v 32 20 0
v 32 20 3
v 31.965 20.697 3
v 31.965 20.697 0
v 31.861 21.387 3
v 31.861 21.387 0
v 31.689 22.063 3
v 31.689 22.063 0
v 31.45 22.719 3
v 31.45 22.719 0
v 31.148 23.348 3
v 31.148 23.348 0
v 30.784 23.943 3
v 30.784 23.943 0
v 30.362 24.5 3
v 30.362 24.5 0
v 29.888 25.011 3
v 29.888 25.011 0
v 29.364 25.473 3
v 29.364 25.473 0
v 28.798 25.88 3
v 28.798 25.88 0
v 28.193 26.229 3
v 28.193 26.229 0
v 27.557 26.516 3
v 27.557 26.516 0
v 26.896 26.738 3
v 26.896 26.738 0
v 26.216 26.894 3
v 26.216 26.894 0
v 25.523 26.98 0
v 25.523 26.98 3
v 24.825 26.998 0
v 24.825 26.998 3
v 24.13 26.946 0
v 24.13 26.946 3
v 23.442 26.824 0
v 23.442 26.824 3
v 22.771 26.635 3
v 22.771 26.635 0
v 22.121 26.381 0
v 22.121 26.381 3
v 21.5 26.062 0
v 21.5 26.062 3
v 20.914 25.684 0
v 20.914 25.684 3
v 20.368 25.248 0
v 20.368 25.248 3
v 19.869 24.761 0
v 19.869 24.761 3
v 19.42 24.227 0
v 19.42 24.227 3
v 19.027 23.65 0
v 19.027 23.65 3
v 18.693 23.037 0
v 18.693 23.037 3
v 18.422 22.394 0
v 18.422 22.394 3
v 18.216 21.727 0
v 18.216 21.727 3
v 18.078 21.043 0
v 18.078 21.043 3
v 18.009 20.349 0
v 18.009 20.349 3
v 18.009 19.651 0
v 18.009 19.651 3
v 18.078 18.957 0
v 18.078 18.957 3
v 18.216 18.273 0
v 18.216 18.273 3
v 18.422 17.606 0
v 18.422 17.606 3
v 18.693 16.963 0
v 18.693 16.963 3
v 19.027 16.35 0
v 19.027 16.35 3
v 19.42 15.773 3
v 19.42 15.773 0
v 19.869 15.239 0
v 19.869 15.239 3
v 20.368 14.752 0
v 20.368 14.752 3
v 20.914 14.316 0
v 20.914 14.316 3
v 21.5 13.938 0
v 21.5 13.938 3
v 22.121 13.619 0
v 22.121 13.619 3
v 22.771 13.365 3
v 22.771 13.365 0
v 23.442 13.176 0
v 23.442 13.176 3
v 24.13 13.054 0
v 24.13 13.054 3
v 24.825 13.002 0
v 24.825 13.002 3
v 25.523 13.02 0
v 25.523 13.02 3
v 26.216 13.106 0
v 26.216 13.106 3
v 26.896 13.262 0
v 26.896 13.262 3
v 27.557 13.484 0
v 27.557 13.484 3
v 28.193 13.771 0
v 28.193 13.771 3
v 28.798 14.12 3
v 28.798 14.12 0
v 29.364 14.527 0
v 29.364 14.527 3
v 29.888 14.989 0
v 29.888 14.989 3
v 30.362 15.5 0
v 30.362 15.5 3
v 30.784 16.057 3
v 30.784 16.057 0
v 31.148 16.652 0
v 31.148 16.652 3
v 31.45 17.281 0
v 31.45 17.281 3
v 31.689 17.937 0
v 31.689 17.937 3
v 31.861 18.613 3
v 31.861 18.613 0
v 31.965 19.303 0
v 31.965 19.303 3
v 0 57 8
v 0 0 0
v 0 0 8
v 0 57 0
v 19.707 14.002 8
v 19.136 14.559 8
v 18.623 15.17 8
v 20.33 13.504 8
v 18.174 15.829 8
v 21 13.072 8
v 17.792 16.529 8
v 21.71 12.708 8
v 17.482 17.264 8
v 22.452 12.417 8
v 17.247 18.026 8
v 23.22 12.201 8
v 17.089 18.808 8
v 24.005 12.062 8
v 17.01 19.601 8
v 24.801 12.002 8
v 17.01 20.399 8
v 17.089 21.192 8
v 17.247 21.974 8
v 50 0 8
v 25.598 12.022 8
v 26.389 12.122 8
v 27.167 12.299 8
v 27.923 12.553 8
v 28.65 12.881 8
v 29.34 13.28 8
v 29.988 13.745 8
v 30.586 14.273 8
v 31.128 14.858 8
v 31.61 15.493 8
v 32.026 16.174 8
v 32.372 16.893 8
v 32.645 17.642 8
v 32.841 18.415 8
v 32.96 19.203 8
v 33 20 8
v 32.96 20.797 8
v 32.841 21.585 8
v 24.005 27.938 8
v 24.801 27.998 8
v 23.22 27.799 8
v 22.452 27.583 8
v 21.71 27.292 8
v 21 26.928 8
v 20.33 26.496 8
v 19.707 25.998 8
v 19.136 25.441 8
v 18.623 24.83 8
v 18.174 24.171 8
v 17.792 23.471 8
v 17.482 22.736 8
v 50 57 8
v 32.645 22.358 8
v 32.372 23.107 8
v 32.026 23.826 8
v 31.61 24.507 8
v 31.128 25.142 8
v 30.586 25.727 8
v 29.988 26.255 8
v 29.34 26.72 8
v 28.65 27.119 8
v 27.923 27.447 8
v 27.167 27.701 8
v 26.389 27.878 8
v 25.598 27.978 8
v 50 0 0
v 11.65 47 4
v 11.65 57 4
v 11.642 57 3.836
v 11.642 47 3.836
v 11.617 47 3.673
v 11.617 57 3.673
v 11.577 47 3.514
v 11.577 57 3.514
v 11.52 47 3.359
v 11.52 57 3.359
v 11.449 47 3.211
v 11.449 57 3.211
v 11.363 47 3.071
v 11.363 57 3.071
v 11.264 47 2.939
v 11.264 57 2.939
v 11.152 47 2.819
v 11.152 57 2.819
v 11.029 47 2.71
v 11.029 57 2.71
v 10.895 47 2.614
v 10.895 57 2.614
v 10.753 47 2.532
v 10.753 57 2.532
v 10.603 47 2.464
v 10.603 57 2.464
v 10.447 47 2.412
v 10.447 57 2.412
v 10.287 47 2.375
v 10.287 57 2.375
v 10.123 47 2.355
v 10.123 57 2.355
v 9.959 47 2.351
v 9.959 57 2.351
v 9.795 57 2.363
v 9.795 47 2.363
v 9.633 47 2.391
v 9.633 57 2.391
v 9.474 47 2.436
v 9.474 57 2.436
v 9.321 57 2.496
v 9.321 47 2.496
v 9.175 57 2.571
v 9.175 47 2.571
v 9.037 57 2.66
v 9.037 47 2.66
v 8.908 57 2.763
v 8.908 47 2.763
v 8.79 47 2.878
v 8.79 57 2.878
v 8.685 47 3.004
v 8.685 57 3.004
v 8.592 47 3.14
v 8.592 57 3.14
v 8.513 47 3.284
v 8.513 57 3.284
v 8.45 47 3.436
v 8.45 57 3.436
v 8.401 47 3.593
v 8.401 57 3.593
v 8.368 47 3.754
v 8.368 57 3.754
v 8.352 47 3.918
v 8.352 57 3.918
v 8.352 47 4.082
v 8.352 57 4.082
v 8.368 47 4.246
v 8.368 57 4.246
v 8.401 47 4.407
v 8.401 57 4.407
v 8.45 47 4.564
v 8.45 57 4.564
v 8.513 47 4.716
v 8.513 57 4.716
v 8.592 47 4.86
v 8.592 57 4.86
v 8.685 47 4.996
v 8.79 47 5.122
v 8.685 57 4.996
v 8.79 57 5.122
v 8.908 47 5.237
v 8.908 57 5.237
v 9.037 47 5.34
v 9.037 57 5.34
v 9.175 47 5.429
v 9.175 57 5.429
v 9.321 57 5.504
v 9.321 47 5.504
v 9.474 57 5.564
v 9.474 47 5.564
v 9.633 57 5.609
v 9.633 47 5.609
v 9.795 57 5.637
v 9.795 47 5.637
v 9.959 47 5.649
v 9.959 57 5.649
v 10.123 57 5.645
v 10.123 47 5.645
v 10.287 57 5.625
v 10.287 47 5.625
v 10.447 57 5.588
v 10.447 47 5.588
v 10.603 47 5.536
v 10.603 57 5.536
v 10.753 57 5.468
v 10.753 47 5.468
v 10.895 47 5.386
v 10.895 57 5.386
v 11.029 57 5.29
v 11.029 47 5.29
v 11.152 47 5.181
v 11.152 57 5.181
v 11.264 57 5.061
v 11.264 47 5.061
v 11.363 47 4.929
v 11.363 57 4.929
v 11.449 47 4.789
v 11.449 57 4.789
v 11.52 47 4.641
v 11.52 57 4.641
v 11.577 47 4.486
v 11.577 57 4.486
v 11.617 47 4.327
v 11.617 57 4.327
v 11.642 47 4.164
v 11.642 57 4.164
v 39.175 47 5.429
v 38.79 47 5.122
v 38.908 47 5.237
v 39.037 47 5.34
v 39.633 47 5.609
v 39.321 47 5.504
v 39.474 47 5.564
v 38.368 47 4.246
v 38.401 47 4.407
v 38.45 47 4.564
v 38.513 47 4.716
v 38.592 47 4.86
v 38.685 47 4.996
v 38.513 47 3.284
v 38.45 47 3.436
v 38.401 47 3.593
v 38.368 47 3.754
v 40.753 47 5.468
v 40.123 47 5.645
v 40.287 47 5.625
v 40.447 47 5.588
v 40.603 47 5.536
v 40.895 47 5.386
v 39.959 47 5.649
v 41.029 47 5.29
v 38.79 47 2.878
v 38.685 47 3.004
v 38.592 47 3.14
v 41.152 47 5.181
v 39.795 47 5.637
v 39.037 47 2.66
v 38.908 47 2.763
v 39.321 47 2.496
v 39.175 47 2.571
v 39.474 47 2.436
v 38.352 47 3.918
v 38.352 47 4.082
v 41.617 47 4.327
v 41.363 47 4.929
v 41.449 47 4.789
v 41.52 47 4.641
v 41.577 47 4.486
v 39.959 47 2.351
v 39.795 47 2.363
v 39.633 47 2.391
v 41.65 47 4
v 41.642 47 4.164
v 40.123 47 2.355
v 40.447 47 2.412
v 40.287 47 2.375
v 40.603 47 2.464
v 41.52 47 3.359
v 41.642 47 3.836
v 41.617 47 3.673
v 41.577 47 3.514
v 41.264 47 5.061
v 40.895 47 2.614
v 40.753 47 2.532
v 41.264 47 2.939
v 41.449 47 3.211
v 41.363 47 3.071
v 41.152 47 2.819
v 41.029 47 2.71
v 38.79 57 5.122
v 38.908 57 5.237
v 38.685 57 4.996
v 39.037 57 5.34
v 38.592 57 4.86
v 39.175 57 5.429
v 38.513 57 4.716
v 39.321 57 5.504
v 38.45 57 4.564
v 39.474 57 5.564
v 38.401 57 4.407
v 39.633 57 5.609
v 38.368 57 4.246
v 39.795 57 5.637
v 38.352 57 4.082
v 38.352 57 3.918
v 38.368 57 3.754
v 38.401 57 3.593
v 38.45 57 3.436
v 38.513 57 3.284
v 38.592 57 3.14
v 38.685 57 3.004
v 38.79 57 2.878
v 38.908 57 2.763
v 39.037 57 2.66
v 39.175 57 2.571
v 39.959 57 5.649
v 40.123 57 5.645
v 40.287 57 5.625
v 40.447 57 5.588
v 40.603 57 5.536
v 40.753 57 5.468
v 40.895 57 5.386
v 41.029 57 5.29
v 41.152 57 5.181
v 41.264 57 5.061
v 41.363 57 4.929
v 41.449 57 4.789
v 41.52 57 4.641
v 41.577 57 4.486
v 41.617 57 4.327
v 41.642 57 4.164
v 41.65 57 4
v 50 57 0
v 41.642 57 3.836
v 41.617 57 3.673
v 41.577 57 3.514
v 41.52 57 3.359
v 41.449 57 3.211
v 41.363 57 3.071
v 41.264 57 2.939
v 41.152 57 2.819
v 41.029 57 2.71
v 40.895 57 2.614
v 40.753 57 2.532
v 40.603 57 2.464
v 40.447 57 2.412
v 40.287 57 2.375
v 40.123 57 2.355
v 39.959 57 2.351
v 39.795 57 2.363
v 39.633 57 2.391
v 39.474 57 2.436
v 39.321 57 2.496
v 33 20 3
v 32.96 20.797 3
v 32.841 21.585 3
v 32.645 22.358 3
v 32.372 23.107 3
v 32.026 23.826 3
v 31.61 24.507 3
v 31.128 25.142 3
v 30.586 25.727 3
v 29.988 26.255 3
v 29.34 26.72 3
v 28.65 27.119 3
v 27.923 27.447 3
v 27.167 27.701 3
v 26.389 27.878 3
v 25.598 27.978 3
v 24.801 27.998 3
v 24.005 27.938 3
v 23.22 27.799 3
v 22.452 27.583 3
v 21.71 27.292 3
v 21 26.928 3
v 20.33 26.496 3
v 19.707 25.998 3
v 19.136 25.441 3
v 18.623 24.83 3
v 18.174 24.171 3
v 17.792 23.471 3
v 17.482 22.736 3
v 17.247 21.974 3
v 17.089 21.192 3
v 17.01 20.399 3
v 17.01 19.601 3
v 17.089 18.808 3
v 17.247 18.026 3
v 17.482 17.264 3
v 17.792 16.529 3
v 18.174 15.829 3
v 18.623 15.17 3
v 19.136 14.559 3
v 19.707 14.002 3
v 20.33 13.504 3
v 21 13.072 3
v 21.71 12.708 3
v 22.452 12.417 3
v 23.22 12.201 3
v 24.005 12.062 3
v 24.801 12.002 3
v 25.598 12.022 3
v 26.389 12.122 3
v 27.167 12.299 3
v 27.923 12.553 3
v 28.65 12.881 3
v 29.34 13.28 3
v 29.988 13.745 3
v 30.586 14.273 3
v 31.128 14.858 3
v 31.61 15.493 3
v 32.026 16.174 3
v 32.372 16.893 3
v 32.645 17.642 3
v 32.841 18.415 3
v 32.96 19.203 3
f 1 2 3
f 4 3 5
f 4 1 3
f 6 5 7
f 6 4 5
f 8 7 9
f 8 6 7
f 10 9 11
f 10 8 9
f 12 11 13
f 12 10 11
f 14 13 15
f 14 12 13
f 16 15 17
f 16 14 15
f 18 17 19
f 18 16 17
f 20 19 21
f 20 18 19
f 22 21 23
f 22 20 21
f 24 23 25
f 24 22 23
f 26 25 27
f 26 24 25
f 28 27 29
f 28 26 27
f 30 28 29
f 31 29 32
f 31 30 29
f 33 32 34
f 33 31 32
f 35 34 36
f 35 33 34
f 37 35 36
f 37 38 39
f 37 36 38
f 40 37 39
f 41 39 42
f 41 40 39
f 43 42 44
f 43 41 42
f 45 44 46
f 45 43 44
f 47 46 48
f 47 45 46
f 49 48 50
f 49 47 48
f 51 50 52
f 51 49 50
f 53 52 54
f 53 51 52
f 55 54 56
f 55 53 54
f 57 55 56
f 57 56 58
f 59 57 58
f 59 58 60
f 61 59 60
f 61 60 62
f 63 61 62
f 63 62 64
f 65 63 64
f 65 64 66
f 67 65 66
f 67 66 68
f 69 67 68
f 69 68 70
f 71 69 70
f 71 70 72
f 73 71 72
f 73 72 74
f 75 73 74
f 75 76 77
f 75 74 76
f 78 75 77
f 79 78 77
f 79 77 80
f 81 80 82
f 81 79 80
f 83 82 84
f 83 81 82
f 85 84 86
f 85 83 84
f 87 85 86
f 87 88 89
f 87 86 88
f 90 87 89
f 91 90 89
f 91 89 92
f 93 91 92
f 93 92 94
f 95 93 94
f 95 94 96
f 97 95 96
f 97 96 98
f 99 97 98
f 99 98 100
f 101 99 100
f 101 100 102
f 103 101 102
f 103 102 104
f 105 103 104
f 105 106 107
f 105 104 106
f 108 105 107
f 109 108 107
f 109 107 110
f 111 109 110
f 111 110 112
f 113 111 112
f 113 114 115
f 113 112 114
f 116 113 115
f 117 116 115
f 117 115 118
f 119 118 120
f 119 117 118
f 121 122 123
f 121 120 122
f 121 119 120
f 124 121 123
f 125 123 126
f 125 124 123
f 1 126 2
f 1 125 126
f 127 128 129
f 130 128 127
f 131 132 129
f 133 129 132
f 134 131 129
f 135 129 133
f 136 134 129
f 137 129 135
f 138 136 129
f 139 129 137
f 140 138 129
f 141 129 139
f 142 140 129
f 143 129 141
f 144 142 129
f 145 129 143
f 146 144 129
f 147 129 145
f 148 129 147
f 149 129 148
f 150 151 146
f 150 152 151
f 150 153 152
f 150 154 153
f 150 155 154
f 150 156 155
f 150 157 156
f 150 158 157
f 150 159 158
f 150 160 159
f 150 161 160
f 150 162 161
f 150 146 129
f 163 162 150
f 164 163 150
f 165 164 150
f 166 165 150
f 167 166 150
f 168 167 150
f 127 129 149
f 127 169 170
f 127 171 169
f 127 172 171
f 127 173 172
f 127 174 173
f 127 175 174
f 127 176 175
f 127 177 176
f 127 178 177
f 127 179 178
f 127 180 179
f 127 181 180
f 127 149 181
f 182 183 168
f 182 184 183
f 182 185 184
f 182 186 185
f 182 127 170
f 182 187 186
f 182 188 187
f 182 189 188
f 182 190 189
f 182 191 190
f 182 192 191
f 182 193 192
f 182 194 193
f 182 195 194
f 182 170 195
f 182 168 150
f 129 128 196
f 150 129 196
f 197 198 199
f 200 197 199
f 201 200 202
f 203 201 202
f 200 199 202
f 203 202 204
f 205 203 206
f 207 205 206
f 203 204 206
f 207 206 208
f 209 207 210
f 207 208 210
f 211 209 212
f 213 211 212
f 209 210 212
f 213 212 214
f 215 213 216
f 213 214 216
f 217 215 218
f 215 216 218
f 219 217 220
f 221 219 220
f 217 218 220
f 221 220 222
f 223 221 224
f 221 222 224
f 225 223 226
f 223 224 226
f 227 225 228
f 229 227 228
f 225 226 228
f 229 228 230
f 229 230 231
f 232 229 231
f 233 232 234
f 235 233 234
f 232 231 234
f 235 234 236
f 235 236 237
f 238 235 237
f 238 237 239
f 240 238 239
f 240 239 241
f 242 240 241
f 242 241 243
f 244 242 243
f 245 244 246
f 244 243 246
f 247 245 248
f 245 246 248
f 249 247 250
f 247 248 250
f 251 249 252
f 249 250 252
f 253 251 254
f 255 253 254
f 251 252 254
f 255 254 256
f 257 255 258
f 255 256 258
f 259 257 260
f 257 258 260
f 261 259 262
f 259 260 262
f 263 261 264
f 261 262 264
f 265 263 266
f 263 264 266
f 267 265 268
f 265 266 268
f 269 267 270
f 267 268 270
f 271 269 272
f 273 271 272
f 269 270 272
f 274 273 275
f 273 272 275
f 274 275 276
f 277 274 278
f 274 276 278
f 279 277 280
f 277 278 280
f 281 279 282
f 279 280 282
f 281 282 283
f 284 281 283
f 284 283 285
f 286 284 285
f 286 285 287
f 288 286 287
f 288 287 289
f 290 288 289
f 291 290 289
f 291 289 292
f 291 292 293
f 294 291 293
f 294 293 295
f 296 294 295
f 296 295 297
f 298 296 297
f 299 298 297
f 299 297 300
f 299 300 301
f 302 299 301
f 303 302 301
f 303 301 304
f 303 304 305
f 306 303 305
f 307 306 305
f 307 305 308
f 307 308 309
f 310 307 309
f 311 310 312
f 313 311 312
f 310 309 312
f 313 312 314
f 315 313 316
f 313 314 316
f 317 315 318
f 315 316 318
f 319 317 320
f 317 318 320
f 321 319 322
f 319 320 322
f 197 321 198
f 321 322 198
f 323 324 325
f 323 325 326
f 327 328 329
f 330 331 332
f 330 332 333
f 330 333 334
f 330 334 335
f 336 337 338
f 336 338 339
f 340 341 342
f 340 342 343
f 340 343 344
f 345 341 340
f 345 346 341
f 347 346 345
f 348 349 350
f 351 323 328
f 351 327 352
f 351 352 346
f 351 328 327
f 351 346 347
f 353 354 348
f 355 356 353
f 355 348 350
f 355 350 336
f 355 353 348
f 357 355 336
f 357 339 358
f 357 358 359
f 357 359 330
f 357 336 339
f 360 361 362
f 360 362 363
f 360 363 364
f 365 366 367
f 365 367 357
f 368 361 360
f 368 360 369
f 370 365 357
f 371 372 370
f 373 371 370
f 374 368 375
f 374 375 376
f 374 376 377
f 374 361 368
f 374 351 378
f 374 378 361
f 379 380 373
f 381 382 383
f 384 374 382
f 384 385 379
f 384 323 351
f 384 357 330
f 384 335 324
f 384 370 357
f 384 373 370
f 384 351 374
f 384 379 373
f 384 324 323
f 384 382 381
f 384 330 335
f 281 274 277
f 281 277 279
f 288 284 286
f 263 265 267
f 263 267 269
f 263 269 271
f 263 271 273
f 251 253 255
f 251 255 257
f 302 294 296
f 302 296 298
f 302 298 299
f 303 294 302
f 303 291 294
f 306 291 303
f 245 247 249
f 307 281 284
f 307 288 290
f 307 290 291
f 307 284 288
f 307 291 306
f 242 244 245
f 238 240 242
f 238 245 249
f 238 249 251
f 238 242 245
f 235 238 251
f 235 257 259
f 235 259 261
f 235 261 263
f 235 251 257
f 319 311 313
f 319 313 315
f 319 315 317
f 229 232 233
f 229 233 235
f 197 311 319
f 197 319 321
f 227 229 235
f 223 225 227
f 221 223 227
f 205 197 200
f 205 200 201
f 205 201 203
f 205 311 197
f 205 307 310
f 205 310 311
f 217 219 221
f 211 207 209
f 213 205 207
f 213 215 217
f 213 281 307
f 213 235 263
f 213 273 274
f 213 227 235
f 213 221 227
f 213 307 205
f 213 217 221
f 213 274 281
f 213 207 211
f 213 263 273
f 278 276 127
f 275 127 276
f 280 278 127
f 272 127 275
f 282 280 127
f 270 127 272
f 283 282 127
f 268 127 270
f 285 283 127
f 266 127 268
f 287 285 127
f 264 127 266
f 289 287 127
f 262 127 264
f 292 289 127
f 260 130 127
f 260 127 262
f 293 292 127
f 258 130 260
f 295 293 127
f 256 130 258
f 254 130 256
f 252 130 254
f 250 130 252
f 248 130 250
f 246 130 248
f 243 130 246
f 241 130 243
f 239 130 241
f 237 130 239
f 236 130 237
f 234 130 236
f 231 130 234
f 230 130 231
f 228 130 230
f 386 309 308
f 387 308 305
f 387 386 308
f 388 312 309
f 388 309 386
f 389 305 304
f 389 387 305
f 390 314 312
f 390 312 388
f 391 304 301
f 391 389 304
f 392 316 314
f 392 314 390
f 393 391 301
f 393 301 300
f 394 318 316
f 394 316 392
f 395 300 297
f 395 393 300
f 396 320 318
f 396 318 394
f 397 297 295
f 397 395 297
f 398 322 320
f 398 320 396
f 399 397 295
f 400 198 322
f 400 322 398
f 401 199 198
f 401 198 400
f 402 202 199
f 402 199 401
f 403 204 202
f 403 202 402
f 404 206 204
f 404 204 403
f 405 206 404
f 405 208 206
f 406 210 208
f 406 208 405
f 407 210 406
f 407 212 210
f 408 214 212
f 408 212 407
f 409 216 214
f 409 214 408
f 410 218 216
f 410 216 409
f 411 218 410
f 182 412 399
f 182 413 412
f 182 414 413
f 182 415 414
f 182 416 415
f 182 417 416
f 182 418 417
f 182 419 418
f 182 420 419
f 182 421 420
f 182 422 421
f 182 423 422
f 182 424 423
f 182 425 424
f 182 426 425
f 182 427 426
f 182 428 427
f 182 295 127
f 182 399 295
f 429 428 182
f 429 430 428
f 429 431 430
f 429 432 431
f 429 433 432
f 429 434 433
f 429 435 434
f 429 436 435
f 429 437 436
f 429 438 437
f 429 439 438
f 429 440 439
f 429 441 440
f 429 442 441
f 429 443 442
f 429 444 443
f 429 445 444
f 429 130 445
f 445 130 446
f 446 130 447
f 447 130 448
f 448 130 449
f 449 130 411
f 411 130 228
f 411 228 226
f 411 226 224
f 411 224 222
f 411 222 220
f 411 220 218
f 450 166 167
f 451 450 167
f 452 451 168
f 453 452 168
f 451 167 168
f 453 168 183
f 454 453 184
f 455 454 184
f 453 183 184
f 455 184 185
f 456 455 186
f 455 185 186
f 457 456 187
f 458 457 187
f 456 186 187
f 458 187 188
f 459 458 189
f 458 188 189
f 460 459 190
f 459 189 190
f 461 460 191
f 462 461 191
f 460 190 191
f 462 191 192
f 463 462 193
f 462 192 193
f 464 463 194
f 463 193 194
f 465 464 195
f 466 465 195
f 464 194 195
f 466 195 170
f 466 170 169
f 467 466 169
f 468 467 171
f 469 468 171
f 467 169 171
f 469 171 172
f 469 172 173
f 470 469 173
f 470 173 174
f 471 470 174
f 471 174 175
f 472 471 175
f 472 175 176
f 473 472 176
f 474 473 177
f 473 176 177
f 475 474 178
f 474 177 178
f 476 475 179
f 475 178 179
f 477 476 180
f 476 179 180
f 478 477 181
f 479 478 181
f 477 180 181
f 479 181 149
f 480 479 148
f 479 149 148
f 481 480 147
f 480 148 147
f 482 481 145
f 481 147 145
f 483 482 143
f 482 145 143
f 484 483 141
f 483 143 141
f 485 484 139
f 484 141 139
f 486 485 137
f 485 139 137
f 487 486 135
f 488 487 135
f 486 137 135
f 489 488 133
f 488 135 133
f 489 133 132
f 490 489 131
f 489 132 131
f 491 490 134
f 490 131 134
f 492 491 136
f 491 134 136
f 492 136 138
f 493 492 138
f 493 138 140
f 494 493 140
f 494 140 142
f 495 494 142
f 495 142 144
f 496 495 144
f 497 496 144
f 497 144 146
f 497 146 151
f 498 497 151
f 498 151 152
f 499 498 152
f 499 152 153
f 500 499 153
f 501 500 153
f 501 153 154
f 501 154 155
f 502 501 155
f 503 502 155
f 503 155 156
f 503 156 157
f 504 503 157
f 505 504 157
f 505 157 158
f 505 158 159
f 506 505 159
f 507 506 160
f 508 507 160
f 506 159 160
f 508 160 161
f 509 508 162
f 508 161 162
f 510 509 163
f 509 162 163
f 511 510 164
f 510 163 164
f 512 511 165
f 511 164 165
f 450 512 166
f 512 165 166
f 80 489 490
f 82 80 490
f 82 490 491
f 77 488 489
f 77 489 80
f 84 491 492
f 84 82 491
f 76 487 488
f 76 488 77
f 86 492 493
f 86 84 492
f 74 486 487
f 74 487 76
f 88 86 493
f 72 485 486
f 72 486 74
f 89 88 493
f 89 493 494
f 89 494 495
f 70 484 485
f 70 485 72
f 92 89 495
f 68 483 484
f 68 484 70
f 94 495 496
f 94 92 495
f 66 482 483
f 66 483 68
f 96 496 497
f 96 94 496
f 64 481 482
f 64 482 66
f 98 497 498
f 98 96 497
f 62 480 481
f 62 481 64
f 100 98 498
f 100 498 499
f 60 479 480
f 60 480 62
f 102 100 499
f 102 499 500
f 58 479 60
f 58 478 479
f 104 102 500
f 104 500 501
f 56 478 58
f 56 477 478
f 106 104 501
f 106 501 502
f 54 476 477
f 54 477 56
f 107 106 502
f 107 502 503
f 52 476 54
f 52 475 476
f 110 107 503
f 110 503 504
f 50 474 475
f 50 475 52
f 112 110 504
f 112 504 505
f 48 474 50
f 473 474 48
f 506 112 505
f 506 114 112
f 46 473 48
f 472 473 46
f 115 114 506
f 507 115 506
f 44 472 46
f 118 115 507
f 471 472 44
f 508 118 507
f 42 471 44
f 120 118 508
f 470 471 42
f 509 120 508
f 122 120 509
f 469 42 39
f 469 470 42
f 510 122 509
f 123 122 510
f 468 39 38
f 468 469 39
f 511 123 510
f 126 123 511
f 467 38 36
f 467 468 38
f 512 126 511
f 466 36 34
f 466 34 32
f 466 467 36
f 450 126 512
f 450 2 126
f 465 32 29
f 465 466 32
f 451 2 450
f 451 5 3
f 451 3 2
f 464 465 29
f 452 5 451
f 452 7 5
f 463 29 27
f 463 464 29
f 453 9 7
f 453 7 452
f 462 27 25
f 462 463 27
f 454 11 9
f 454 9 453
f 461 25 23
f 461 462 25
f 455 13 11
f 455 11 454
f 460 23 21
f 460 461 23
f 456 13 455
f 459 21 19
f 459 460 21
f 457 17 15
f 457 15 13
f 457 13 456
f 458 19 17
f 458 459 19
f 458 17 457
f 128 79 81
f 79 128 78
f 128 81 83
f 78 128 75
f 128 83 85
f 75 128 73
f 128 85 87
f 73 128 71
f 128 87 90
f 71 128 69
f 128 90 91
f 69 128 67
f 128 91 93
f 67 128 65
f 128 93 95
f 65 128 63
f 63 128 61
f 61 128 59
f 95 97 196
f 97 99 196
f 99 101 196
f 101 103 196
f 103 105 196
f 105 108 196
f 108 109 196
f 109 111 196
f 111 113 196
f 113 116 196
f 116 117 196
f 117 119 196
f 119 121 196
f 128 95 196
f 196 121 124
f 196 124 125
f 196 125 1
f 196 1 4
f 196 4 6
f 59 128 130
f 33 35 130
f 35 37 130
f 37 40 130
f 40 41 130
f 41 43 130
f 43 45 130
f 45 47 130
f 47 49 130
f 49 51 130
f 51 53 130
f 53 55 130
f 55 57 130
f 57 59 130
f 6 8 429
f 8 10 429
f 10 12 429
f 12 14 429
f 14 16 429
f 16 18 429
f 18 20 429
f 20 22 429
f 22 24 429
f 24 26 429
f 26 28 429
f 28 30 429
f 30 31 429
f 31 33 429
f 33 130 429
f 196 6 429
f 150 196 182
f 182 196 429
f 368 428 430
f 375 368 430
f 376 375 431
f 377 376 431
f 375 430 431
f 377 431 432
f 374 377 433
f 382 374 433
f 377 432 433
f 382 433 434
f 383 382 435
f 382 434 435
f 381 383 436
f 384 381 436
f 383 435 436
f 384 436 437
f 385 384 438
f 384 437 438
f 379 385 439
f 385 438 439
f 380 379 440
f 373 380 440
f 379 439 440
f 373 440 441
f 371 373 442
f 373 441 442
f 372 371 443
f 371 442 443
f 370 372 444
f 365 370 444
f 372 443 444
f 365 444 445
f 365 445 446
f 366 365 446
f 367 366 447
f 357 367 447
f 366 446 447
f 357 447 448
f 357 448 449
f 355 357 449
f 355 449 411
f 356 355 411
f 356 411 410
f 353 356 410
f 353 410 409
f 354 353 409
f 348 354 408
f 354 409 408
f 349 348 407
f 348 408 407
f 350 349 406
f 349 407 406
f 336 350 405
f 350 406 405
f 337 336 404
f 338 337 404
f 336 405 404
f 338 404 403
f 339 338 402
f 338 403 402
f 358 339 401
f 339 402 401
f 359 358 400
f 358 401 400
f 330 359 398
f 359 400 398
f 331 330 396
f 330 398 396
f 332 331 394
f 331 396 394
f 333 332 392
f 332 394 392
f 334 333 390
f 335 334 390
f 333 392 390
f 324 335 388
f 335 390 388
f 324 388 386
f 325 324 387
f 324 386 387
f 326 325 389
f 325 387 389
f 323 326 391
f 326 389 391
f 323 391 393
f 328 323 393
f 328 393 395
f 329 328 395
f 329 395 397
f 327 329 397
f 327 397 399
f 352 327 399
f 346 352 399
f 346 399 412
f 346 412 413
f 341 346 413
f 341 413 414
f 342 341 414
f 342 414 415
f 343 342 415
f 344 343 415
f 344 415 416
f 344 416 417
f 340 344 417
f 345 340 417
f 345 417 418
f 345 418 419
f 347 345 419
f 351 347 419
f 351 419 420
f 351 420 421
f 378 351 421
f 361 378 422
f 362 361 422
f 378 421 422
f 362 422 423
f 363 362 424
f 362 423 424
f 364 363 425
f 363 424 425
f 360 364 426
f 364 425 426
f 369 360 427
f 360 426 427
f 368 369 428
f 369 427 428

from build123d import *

# Parameters (mm, degrees)
ESQUISSE1_W             = 50
ESQUISSE1_H             = 57
ESQUISSE1_R             = 7
BOSS_EXTRU_1_DEPTH      = 8
ESQUISSE2_R             = 8
ENL_V_MAT_EXTRU_1_DEPTH = 5
ESQUISSE3_R             = 1.65
ENL_V_MAT_EXTRU_2_DEPTH = 10


with BuildPart() as part:
    # Esquisse1 → Boss.-Extru.1 (new body)
    with BuildSketch(Plane.XY):
        with Locations((25, 28.5)):
            Rectangle(ESQUISSE1_W, ESQUISSE1_H)
        with Locations((25, 20)):
            Circle(ESQUISSE1_R, mode=Mode.SUBTRACT)
    extrude(amount=BOSS_EXTRU_1_DEPTH)

    # Esquisse2 → Enlèv. mat.-Extru.1 (cut)
    with BuildSketch(Plane.XY.offset(8)):
        with Locations((25, 20)):
            Circle(ESQUISSE2_R)
    extrude(amount=-ENL_V_MAT_EXTRU_1_DEPTH, mode=Mode.SUBTRACT)

    # Esquisse3 → Enlèv. mat.-Extru.2 (cut)
    with BuildSketch(Plane(origin=(0, 57, 0), x_dir=(1, 0, 0), z_dir=(0, 1, 0))):
        with Locations((10, -4)):
            Circle(ESQUISSE3_R)
        with Locations((40, -4)):
            Circle(ESQUISSE3_R)
    extrude(amount=-ENL_V_MAT_EXTRU_2_DEPTH, mode=Mode.SUBTRACT)


solid = part.part
